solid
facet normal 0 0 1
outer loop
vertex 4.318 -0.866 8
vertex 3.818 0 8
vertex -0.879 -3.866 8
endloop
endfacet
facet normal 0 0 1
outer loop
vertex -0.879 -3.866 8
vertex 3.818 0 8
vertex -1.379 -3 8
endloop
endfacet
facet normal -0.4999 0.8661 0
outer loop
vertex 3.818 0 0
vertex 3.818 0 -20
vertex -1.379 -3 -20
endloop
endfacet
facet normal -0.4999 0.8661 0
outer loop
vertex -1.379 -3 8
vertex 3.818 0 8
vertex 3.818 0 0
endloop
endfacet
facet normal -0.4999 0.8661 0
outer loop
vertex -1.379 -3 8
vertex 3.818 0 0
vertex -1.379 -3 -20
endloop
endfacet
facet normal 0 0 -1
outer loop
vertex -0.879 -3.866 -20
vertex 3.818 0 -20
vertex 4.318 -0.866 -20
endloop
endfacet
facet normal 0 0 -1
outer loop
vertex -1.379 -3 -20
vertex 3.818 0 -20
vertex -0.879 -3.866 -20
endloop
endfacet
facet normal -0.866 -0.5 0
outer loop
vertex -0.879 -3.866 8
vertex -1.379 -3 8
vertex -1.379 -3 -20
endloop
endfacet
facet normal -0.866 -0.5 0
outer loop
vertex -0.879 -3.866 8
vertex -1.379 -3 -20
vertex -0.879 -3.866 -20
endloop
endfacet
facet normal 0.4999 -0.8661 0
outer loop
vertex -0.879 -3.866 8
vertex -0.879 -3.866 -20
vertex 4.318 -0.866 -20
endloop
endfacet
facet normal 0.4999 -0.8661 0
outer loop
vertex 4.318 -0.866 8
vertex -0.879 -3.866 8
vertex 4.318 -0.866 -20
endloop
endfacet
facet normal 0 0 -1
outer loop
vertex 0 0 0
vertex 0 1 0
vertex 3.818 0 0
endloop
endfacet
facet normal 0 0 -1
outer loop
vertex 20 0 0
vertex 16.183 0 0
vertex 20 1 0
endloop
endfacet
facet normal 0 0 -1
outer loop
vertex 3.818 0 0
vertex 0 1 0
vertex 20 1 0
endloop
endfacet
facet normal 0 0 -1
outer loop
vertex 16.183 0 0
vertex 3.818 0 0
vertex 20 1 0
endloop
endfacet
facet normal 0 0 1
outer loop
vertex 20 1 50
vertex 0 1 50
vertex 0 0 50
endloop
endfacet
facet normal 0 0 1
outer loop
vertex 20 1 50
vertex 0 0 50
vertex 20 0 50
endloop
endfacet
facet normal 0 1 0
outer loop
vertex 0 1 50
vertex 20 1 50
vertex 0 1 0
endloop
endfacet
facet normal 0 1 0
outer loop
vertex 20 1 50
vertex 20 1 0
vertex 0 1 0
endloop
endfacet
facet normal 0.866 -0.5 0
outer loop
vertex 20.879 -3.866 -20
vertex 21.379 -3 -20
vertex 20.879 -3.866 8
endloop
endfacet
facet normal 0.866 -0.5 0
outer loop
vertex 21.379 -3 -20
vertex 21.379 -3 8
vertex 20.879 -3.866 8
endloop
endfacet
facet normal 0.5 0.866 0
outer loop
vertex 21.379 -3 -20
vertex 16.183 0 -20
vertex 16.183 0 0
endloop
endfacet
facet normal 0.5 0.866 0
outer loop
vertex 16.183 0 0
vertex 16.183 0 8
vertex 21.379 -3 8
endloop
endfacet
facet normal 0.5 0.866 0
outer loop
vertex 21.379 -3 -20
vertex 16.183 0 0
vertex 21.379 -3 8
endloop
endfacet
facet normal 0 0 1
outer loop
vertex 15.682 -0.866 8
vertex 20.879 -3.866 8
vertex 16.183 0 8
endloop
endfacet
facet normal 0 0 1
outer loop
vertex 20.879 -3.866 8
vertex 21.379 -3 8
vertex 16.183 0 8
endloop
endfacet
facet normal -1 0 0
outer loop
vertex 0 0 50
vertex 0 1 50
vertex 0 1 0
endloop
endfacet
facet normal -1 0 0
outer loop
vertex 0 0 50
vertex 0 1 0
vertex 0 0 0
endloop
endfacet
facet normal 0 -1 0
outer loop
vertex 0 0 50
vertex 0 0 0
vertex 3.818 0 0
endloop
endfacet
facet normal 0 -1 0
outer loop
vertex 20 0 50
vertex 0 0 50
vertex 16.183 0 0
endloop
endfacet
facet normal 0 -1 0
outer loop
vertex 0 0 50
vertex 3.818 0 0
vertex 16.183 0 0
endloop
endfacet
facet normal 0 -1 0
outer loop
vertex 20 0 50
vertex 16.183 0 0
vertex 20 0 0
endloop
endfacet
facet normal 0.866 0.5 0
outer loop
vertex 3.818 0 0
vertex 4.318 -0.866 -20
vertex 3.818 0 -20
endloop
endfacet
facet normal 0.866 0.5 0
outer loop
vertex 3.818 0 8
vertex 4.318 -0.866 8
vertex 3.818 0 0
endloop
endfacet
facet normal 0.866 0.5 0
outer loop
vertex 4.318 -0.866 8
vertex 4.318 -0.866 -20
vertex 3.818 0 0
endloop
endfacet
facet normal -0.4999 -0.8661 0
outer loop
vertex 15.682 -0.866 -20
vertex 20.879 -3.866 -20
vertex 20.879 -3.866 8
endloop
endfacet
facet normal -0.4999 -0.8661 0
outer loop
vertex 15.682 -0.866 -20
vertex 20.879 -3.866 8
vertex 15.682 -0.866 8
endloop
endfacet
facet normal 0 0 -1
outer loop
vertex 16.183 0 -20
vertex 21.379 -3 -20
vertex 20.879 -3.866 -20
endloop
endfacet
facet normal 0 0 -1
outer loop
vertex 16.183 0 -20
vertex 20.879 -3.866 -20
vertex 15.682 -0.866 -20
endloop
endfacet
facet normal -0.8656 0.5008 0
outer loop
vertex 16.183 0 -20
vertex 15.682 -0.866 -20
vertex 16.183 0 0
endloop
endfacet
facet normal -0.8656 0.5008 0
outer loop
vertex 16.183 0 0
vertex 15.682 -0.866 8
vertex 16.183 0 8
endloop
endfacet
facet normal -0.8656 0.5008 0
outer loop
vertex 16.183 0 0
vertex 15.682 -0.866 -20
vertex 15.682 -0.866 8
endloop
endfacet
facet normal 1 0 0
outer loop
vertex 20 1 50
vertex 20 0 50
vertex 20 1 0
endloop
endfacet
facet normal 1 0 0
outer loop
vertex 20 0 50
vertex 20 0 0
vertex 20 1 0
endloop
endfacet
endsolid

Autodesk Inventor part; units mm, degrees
ref_plane "YZ Plane" through (0, 0, 0) normal (1, 0, 0) x (0, 1, 0)
ref_plane "XZ Plane" through (0, 0, 0) normal (0, 1, 0) x (-1, 0, 0)
ref_plane "XY Plane" through (0, 0, 0) normal (0, 0, 1) x (1, 0, 0)
sketch "Sketch1" plane through (0, 0, 0) normal (0, 0, 1) x (1, 0, 0)
  line L0 (0, 0) -> (20, 0)
  line L1 (20, 0) -> (20, 1)
  line L2 (20, 1) -> (0, 1)
  line L3 (0, 1) -> (0, 0)
  dimension "d0" = 20
  dimension "d1" = 1
extrude "Extrusion1" add sketch "Sketch1" along normal blind 50
sketch "Sketch2" plane through (0, 0, 0) normal (0, 0, -1) x (-1, 0, 0)
  line L0 (0, 0) -> (-20, 0) projected
  line L1 (-3.8175, 0) -> (1.3787, -3)
  line L2 (1.3787, -3) -> (0.8787, -3.866)
  line L3 (0.8787, -3.866) -> (-4.3175, -0.866)
  line L4 (-4.3175, -0.866) -> (-3.8175, 0)
  line L5 (-10, 0) -> (-10, -4.6916)
  line L6 (-16.1825, 0) -> (-21.3787, -3)
  line L7 (-21.3787, -3) -> (-20.8787, -3.866)
  line L8 (-20.8787, -3.866) -> (-15.6825, -0.866)
  line L9 (-15.6825, -0.866) -> (-16.1825, 0)
  dimension "d4" = 1
  dimension "d6" = 12.365
  dimension "d7" = 120
  dimension "d8" = 6
extrude "Extrusion2" add sketch "Sketch2" along normal blind 20 and the other way blind 8
properties part number "buttons_PCBs"
